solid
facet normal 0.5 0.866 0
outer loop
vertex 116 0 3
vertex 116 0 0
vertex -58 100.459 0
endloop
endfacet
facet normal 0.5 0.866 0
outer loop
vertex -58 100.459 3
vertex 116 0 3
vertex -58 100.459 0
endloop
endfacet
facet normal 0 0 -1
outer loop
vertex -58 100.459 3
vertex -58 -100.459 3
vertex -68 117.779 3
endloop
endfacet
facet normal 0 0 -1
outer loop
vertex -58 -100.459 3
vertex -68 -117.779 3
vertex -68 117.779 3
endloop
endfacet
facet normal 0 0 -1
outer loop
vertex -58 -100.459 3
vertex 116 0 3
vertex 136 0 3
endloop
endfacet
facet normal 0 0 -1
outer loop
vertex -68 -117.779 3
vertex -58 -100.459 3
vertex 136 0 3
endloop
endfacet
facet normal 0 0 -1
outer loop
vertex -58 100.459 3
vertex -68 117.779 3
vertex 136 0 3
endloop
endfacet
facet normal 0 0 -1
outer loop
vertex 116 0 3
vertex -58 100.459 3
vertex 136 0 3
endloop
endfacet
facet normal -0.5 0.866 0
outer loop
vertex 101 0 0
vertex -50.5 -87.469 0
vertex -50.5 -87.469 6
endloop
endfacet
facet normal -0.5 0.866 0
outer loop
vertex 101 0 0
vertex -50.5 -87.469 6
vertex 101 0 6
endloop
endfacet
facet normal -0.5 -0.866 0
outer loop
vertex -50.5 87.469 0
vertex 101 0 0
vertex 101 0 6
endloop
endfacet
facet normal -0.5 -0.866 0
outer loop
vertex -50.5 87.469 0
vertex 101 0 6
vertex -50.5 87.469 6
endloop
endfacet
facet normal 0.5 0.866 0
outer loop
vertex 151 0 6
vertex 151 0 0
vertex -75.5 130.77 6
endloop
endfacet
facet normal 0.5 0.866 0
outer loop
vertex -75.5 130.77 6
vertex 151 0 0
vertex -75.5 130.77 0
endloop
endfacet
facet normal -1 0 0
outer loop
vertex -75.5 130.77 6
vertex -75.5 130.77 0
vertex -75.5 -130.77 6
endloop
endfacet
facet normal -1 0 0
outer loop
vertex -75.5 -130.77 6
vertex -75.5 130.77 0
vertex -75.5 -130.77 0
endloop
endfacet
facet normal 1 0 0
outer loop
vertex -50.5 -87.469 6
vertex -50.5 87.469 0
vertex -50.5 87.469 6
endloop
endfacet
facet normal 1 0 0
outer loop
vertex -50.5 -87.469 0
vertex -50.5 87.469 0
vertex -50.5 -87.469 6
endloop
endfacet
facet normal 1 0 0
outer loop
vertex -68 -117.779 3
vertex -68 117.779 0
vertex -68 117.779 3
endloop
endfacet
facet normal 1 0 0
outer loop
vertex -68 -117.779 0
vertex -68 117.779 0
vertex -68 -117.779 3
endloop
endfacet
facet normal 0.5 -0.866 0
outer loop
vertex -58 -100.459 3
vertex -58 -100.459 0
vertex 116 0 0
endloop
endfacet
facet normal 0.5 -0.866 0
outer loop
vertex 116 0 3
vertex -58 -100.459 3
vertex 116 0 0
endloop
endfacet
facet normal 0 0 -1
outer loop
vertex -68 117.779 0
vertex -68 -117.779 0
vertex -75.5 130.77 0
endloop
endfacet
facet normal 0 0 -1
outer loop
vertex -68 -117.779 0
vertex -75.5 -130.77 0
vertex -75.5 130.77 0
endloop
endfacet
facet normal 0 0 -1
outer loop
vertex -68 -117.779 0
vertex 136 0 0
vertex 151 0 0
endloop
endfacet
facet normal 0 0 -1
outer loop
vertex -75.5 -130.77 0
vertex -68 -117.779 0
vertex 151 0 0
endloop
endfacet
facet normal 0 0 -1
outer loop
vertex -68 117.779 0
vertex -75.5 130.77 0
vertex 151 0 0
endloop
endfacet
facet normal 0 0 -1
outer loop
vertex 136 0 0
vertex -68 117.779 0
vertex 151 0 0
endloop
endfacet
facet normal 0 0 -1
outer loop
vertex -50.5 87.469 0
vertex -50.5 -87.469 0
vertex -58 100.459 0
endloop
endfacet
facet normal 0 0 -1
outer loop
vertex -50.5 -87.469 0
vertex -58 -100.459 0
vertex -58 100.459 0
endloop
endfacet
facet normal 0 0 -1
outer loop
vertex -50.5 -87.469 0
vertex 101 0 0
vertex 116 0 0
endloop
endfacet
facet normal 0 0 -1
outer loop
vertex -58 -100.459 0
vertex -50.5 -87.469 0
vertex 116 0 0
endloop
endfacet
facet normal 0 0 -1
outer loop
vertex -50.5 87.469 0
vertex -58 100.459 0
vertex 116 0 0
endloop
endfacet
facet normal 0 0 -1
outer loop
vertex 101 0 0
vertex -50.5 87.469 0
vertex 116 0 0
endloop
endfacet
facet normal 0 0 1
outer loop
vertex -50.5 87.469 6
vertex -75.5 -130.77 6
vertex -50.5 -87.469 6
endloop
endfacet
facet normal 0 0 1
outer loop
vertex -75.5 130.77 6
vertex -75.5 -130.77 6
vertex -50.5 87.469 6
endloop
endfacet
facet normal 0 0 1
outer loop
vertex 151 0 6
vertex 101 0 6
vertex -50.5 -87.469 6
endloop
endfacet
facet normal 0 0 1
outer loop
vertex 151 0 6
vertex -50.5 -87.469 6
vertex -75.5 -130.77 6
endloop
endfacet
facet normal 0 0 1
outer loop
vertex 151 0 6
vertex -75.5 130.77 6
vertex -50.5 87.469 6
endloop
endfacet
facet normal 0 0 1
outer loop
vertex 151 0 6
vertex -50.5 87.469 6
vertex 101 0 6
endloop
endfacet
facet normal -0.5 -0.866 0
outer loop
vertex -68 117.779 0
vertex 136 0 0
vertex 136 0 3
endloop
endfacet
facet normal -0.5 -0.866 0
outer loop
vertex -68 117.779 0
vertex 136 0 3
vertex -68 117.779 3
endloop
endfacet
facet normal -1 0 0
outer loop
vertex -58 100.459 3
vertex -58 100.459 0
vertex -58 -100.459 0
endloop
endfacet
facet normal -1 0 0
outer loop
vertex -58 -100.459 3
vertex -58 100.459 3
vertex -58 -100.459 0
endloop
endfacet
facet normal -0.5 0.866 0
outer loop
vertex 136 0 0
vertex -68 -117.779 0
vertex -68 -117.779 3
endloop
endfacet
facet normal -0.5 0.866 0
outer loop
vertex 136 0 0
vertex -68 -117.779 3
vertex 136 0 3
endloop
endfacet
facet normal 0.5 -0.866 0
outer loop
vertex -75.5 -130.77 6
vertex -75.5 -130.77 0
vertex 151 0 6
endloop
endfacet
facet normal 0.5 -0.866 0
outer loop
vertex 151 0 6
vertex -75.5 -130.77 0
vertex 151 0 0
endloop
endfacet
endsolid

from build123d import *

# Parameters (mm, degrees)
PRISM003_DEPTH = 15
PRISM001_DEPTH = 3
PRISM_DEPTH    = 3
PRISM002_DEPTH = 6


with BuildPart() as prism003:
    # Prism003 → Prism003 (new body)
    with BuildSketch(Plane.XY):
        Polygon((101, 0), (-50.5, 87.468566), (-50.5, -87.468566), align=None)
    extrude(amount=PRISM003_DEPTH)


with BuildPart() as prism001:
    # Prism001 → Prism001 (new body)
    with BuildSketch(Plane.XY):
        Polygon((116, 0), (-58, 100.458947), (-58, -100.458947), align=None)
    extrude(amount=PRISM001_DEPTH)


with BuildPart() as cut:
    # Prism → Prism (new body)
    with BuildSketch(Plane.XY):
        Polygon((136, 0), (-68, 117.779455), (-68, -117.779455), align=None)
    extrude(amount=PRISM_DEPTH)

    # Cut: cut Prism001
    add(prism001.part, mode=Mode.SUBTRACT)


with BuildPart() as cut002:
    # Prism002 → Prism002 (new body)
    with BuildSketch(Plane.XY):
        Polygon((151, 0), (-75.5, 130.769836), (-75.5, -130.769836), align=None)
    extrude(amount=PRISM002_DEPTH)

    # Cut001: cut Cut
    add(cut.part, mode=Mode.SUBTRACT)

    # Cut002: cut Prism003
    add(prism003.part, mode=Mode.SUBTRACT)


solid = cut002.part
